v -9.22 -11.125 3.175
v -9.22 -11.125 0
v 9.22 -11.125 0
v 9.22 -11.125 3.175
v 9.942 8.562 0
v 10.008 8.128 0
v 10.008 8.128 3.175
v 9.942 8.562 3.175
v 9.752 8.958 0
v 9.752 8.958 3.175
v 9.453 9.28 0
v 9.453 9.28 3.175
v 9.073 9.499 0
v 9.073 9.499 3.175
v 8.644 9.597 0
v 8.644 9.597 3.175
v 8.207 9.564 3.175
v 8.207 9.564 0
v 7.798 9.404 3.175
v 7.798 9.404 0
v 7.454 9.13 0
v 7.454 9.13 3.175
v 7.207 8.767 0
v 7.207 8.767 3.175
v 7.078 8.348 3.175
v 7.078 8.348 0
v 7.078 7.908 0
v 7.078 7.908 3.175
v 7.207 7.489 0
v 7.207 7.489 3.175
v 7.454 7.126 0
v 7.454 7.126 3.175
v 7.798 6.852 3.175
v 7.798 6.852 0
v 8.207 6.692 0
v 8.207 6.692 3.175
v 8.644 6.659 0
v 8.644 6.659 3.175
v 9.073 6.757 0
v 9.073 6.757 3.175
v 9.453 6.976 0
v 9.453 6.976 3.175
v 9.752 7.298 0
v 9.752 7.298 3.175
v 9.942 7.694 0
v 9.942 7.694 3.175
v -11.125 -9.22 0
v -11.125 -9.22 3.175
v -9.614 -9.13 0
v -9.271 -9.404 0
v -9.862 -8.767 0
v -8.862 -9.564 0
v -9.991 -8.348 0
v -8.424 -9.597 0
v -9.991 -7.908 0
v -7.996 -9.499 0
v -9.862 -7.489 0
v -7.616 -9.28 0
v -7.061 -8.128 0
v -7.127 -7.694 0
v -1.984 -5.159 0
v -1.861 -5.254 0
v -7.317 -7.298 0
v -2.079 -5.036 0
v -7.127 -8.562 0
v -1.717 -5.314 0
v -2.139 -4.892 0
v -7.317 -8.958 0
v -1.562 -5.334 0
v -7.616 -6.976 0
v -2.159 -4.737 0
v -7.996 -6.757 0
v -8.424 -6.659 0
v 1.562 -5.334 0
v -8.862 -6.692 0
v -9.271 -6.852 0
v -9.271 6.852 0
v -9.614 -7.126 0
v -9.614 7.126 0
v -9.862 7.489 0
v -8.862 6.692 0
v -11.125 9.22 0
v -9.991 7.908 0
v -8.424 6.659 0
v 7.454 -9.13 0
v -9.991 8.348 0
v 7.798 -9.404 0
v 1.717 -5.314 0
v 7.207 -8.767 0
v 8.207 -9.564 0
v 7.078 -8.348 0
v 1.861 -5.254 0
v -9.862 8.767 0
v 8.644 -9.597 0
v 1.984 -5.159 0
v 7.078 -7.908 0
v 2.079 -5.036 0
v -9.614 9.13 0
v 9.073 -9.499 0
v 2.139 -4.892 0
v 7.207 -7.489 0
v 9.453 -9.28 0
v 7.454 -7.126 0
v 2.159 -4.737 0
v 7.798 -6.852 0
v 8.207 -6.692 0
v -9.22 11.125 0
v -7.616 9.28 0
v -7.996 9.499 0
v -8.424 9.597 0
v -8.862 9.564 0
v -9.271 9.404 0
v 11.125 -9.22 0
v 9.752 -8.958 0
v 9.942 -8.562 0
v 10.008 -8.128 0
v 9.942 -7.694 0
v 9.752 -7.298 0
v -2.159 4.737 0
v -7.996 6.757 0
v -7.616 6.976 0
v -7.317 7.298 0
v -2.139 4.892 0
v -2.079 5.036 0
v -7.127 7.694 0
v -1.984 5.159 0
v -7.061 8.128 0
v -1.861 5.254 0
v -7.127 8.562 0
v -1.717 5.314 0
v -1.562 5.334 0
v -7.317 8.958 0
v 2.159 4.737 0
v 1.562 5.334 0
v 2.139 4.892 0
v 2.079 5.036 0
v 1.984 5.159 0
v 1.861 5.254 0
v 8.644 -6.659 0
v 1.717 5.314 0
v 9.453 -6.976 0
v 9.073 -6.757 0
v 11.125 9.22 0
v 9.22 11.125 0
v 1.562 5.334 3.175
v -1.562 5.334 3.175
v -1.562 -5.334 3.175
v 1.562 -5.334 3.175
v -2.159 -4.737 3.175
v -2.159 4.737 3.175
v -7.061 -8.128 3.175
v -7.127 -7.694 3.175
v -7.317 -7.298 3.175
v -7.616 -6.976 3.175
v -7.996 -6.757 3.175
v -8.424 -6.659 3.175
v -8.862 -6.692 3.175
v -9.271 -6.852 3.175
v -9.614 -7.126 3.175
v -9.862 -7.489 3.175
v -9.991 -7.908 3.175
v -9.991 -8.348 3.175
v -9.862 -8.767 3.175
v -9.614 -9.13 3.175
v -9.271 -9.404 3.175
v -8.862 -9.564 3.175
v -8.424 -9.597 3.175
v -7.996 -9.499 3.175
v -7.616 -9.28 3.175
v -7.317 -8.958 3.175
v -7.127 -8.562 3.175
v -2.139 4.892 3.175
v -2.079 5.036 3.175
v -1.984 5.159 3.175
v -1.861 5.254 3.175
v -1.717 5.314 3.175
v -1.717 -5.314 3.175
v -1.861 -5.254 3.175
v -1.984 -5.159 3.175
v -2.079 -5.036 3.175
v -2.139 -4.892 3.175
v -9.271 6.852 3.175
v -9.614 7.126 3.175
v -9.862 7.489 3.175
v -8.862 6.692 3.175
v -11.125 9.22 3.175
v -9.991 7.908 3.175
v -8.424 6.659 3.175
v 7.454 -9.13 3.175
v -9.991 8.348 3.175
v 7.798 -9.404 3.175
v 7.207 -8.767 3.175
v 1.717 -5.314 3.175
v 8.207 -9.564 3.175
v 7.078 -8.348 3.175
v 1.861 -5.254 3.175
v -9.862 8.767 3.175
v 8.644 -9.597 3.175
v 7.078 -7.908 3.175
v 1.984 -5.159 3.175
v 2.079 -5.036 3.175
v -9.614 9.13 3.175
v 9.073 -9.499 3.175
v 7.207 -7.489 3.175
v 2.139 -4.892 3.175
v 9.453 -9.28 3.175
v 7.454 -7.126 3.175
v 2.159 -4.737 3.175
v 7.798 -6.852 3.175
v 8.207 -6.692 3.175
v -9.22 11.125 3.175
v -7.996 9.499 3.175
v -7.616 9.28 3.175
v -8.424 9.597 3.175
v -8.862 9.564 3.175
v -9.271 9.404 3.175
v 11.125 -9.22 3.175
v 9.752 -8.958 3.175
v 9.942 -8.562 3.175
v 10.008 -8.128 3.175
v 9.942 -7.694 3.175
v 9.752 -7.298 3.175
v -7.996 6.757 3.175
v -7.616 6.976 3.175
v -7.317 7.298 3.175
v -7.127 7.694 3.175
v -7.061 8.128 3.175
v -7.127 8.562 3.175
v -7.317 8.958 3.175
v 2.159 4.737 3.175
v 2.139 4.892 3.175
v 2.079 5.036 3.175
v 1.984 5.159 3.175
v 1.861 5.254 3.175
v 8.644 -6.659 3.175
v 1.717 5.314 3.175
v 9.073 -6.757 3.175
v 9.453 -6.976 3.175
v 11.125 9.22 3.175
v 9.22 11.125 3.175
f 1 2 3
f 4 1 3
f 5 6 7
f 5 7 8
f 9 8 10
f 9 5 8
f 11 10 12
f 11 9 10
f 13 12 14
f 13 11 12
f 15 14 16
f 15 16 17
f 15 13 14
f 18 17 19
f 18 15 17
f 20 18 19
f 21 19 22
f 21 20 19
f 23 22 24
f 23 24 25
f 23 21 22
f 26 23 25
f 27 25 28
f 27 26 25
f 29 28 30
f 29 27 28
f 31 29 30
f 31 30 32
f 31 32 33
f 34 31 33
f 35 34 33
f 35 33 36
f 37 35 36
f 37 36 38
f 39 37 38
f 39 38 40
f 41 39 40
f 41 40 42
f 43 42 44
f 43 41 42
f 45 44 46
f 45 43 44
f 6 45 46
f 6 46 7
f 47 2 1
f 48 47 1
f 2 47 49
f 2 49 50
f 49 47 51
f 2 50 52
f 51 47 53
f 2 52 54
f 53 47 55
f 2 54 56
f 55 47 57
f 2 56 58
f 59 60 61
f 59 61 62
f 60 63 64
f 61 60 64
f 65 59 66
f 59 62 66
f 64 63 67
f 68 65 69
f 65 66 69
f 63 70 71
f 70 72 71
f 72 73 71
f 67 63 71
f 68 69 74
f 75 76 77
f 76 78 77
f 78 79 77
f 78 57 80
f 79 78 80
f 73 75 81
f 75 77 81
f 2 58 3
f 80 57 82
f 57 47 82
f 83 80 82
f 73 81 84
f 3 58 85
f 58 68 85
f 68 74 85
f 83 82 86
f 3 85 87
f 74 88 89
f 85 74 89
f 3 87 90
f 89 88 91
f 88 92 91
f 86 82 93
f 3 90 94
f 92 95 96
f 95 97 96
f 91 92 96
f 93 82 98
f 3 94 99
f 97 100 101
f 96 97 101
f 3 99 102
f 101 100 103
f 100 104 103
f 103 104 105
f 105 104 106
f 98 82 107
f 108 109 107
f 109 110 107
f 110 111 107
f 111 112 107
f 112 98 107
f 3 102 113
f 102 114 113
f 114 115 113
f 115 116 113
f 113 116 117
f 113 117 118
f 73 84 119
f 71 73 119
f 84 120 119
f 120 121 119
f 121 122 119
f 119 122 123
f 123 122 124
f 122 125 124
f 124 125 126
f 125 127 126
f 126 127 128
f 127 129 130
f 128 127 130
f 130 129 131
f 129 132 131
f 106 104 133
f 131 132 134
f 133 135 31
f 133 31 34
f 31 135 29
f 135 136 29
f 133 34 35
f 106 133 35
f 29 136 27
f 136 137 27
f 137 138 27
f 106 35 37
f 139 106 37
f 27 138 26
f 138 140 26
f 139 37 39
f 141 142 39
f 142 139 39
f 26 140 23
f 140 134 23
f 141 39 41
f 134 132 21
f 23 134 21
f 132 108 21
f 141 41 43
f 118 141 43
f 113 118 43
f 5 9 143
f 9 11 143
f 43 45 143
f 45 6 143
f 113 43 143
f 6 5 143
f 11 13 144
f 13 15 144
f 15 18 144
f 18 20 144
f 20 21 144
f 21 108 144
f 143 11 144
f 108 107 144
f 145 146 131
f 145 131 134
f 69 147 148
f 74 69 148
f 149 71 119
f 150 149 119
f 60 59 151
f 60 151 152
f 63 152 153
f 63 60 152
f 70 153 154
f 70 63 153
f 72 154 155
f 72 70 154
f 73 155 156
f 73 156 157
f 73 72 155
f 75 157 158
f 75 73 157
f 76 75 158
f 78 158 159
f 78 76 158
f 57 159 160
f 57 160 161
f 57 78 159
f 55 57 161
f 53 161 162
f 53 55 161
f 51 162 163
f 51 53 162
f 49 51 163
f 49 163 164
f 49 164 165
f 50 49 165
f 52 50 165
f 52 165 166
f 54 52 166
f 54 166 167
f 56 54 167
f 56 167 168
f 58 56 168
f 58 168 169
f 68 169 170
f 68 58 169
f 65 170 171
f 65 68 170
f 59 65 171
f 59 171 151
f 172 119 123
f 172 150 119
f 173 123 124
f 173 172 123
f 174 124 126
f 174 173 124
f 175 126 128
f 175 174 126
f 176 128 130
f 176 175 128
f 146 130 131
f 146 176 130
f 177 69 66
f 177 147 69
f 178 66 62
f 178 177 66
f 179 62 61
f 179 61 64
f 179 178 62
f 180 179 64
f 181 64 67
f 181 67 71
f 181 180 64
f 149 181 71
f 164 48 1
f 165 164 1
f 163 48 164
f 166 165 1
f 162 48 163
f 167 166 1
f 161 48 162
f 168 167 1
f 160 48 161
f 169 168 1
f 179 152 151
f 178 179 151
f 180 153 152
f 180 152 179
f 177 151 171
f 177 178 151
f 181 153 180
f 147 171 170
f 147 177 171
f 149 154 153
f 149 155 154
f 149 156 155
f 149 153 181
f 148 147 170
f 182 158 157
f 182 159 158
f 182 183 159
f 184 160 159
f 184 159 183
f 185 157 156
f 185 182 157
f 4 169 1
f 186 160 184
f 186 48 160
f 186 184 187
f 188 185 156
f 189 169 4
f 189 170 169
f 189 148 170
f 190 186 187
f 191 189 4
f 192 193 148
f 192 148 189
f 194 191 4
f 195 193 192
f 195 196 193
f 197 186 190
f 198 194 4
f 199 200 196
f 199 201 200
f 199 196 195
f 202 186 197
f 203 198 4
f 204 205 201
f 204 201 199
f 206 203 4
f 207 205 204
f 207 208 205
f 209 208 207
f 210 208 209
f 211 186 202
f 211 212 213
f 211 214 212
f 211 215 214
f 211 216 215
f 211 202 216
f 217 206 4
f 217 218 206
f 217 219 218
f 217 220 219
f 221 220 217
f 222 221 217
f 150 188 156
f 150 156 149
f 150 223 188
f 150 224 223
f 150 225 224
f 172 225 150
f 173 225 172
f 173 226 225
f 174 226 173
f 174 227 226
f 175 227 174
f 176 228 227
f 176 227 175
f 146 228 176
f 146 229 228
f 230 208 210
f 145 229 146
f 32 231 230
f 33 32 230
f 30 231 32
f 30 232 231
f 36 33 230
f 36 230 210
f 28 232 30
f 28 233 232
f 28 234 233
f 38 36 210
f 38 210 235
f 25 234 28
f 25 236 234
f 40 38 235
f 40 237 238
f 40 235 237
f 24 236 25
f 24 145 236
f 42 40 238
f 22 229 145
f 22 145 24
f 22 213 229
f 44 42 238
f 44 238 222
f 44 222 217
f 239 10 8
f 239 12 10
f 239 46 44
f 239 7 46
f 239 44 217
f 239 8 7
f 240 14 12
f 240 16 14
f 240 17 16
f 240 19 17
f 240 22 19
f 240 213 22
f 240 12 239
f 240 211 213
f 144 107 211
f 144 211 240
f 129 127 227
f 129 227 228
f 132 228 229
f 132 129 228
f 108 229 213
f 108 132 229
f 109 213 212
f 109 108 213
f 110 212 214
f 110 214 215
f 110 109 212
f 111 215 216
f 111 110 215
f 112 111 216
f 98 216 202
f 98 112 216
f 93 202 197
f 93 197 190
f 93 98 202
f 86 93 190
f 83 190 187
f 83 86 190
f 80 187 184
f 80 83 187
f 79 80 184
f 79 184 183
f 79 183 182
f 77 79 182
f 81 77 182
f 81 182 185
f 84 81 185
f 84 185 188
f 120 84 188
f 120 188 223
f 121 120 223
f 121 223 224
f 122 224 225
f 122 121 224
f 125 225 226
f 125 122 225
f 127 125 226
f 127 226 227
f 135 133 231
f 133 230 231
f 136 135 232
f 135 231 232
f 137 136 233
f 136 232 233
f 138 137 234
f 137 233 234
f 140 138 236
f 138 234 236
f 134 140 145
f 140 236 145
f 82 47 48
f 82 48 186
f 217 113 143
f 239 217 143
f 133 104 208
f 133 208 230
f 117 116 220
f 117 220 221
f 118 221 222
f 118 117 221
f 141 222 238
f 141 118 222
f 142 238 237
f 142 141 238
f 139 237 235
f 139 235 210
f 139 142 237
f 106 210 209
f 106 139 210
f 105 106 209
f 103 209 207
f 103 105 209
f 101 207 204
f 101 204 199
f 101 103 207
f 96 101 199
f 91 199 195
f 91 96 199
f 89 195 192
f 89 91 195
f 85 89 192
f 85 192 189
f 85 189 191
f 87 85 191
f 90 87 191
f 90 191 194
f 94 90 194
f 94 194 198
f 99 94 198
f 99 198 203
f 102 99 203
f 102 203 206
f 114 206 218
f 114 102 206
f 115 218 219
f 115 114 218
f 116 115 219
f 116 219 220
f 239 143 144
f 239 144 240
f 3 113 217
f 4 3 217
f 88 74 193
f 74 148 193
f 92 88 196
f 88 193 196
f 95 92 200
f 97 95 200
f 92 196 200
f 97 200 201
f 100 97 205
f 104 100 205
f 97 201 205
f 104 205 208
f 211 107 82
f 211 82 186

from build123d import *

# Parameters (mm, degrees)
F0_W     = 22.2504
F0_H     = 22.2504
F0_R     = 1.4732
F0_W_2   = 4.318
F0_H_2   = 10.668
F1_DEPTH = 3.175
F2_SIZE  = 1.905
F3_R     = 0.5969


with BuildPart() as f1:
    # F0 (on Top) → F1 (new body)
    with BuildSketch(Plane.XY):
        Rectangle(F0_W, F0_H)
        with Locations((-8.5344, -8.128)):
            Circle(F0_R, mode=Mode.SUBTRACT)
        with Locations((8.5344, -8.128)):
            Circle(F0_R, mode=Mode.SUBTRACT)
        with Locations((-8.5344, 8.128)):
            Circle(F0_R, mode=Mode.SUBTRACT)
        Rectangle(F0_W_2, F0_H_2, mode=Mode.SUBTRACT)
        with Locations((8.5344, 8.128)):
            Circle(F0_R, mode=Mode.SUBTRACT)
    extrude(amount=F1_DEPTH)

    # F2
    f2_edges = [f1.edges().sort_by_distance(p)[0] for p in [
        (-11.1252, -11.1252, 1.5875),
        (-11.1252, 11.1252, 1.5875),
        (11.1252, 11.1252, 1.5875),
        (11.1252, -11.1252, 1.5875),
    ]]
    chamfer(f2_edges, length=F2_SIZE)

    # F3
    f3_edges = [f1.edges().sort_by_distance(p)[0] for p in [
        (2.159, -5.334, 1.5875),
        (-2.159, -5.334, 1.5875),
        (-2.159, 5.334, 1.5875),
        (2.159, 5.334, 1.5875),
    ]]
    fillet(f3_edges, radius=F3_R)


solid = f1.part
